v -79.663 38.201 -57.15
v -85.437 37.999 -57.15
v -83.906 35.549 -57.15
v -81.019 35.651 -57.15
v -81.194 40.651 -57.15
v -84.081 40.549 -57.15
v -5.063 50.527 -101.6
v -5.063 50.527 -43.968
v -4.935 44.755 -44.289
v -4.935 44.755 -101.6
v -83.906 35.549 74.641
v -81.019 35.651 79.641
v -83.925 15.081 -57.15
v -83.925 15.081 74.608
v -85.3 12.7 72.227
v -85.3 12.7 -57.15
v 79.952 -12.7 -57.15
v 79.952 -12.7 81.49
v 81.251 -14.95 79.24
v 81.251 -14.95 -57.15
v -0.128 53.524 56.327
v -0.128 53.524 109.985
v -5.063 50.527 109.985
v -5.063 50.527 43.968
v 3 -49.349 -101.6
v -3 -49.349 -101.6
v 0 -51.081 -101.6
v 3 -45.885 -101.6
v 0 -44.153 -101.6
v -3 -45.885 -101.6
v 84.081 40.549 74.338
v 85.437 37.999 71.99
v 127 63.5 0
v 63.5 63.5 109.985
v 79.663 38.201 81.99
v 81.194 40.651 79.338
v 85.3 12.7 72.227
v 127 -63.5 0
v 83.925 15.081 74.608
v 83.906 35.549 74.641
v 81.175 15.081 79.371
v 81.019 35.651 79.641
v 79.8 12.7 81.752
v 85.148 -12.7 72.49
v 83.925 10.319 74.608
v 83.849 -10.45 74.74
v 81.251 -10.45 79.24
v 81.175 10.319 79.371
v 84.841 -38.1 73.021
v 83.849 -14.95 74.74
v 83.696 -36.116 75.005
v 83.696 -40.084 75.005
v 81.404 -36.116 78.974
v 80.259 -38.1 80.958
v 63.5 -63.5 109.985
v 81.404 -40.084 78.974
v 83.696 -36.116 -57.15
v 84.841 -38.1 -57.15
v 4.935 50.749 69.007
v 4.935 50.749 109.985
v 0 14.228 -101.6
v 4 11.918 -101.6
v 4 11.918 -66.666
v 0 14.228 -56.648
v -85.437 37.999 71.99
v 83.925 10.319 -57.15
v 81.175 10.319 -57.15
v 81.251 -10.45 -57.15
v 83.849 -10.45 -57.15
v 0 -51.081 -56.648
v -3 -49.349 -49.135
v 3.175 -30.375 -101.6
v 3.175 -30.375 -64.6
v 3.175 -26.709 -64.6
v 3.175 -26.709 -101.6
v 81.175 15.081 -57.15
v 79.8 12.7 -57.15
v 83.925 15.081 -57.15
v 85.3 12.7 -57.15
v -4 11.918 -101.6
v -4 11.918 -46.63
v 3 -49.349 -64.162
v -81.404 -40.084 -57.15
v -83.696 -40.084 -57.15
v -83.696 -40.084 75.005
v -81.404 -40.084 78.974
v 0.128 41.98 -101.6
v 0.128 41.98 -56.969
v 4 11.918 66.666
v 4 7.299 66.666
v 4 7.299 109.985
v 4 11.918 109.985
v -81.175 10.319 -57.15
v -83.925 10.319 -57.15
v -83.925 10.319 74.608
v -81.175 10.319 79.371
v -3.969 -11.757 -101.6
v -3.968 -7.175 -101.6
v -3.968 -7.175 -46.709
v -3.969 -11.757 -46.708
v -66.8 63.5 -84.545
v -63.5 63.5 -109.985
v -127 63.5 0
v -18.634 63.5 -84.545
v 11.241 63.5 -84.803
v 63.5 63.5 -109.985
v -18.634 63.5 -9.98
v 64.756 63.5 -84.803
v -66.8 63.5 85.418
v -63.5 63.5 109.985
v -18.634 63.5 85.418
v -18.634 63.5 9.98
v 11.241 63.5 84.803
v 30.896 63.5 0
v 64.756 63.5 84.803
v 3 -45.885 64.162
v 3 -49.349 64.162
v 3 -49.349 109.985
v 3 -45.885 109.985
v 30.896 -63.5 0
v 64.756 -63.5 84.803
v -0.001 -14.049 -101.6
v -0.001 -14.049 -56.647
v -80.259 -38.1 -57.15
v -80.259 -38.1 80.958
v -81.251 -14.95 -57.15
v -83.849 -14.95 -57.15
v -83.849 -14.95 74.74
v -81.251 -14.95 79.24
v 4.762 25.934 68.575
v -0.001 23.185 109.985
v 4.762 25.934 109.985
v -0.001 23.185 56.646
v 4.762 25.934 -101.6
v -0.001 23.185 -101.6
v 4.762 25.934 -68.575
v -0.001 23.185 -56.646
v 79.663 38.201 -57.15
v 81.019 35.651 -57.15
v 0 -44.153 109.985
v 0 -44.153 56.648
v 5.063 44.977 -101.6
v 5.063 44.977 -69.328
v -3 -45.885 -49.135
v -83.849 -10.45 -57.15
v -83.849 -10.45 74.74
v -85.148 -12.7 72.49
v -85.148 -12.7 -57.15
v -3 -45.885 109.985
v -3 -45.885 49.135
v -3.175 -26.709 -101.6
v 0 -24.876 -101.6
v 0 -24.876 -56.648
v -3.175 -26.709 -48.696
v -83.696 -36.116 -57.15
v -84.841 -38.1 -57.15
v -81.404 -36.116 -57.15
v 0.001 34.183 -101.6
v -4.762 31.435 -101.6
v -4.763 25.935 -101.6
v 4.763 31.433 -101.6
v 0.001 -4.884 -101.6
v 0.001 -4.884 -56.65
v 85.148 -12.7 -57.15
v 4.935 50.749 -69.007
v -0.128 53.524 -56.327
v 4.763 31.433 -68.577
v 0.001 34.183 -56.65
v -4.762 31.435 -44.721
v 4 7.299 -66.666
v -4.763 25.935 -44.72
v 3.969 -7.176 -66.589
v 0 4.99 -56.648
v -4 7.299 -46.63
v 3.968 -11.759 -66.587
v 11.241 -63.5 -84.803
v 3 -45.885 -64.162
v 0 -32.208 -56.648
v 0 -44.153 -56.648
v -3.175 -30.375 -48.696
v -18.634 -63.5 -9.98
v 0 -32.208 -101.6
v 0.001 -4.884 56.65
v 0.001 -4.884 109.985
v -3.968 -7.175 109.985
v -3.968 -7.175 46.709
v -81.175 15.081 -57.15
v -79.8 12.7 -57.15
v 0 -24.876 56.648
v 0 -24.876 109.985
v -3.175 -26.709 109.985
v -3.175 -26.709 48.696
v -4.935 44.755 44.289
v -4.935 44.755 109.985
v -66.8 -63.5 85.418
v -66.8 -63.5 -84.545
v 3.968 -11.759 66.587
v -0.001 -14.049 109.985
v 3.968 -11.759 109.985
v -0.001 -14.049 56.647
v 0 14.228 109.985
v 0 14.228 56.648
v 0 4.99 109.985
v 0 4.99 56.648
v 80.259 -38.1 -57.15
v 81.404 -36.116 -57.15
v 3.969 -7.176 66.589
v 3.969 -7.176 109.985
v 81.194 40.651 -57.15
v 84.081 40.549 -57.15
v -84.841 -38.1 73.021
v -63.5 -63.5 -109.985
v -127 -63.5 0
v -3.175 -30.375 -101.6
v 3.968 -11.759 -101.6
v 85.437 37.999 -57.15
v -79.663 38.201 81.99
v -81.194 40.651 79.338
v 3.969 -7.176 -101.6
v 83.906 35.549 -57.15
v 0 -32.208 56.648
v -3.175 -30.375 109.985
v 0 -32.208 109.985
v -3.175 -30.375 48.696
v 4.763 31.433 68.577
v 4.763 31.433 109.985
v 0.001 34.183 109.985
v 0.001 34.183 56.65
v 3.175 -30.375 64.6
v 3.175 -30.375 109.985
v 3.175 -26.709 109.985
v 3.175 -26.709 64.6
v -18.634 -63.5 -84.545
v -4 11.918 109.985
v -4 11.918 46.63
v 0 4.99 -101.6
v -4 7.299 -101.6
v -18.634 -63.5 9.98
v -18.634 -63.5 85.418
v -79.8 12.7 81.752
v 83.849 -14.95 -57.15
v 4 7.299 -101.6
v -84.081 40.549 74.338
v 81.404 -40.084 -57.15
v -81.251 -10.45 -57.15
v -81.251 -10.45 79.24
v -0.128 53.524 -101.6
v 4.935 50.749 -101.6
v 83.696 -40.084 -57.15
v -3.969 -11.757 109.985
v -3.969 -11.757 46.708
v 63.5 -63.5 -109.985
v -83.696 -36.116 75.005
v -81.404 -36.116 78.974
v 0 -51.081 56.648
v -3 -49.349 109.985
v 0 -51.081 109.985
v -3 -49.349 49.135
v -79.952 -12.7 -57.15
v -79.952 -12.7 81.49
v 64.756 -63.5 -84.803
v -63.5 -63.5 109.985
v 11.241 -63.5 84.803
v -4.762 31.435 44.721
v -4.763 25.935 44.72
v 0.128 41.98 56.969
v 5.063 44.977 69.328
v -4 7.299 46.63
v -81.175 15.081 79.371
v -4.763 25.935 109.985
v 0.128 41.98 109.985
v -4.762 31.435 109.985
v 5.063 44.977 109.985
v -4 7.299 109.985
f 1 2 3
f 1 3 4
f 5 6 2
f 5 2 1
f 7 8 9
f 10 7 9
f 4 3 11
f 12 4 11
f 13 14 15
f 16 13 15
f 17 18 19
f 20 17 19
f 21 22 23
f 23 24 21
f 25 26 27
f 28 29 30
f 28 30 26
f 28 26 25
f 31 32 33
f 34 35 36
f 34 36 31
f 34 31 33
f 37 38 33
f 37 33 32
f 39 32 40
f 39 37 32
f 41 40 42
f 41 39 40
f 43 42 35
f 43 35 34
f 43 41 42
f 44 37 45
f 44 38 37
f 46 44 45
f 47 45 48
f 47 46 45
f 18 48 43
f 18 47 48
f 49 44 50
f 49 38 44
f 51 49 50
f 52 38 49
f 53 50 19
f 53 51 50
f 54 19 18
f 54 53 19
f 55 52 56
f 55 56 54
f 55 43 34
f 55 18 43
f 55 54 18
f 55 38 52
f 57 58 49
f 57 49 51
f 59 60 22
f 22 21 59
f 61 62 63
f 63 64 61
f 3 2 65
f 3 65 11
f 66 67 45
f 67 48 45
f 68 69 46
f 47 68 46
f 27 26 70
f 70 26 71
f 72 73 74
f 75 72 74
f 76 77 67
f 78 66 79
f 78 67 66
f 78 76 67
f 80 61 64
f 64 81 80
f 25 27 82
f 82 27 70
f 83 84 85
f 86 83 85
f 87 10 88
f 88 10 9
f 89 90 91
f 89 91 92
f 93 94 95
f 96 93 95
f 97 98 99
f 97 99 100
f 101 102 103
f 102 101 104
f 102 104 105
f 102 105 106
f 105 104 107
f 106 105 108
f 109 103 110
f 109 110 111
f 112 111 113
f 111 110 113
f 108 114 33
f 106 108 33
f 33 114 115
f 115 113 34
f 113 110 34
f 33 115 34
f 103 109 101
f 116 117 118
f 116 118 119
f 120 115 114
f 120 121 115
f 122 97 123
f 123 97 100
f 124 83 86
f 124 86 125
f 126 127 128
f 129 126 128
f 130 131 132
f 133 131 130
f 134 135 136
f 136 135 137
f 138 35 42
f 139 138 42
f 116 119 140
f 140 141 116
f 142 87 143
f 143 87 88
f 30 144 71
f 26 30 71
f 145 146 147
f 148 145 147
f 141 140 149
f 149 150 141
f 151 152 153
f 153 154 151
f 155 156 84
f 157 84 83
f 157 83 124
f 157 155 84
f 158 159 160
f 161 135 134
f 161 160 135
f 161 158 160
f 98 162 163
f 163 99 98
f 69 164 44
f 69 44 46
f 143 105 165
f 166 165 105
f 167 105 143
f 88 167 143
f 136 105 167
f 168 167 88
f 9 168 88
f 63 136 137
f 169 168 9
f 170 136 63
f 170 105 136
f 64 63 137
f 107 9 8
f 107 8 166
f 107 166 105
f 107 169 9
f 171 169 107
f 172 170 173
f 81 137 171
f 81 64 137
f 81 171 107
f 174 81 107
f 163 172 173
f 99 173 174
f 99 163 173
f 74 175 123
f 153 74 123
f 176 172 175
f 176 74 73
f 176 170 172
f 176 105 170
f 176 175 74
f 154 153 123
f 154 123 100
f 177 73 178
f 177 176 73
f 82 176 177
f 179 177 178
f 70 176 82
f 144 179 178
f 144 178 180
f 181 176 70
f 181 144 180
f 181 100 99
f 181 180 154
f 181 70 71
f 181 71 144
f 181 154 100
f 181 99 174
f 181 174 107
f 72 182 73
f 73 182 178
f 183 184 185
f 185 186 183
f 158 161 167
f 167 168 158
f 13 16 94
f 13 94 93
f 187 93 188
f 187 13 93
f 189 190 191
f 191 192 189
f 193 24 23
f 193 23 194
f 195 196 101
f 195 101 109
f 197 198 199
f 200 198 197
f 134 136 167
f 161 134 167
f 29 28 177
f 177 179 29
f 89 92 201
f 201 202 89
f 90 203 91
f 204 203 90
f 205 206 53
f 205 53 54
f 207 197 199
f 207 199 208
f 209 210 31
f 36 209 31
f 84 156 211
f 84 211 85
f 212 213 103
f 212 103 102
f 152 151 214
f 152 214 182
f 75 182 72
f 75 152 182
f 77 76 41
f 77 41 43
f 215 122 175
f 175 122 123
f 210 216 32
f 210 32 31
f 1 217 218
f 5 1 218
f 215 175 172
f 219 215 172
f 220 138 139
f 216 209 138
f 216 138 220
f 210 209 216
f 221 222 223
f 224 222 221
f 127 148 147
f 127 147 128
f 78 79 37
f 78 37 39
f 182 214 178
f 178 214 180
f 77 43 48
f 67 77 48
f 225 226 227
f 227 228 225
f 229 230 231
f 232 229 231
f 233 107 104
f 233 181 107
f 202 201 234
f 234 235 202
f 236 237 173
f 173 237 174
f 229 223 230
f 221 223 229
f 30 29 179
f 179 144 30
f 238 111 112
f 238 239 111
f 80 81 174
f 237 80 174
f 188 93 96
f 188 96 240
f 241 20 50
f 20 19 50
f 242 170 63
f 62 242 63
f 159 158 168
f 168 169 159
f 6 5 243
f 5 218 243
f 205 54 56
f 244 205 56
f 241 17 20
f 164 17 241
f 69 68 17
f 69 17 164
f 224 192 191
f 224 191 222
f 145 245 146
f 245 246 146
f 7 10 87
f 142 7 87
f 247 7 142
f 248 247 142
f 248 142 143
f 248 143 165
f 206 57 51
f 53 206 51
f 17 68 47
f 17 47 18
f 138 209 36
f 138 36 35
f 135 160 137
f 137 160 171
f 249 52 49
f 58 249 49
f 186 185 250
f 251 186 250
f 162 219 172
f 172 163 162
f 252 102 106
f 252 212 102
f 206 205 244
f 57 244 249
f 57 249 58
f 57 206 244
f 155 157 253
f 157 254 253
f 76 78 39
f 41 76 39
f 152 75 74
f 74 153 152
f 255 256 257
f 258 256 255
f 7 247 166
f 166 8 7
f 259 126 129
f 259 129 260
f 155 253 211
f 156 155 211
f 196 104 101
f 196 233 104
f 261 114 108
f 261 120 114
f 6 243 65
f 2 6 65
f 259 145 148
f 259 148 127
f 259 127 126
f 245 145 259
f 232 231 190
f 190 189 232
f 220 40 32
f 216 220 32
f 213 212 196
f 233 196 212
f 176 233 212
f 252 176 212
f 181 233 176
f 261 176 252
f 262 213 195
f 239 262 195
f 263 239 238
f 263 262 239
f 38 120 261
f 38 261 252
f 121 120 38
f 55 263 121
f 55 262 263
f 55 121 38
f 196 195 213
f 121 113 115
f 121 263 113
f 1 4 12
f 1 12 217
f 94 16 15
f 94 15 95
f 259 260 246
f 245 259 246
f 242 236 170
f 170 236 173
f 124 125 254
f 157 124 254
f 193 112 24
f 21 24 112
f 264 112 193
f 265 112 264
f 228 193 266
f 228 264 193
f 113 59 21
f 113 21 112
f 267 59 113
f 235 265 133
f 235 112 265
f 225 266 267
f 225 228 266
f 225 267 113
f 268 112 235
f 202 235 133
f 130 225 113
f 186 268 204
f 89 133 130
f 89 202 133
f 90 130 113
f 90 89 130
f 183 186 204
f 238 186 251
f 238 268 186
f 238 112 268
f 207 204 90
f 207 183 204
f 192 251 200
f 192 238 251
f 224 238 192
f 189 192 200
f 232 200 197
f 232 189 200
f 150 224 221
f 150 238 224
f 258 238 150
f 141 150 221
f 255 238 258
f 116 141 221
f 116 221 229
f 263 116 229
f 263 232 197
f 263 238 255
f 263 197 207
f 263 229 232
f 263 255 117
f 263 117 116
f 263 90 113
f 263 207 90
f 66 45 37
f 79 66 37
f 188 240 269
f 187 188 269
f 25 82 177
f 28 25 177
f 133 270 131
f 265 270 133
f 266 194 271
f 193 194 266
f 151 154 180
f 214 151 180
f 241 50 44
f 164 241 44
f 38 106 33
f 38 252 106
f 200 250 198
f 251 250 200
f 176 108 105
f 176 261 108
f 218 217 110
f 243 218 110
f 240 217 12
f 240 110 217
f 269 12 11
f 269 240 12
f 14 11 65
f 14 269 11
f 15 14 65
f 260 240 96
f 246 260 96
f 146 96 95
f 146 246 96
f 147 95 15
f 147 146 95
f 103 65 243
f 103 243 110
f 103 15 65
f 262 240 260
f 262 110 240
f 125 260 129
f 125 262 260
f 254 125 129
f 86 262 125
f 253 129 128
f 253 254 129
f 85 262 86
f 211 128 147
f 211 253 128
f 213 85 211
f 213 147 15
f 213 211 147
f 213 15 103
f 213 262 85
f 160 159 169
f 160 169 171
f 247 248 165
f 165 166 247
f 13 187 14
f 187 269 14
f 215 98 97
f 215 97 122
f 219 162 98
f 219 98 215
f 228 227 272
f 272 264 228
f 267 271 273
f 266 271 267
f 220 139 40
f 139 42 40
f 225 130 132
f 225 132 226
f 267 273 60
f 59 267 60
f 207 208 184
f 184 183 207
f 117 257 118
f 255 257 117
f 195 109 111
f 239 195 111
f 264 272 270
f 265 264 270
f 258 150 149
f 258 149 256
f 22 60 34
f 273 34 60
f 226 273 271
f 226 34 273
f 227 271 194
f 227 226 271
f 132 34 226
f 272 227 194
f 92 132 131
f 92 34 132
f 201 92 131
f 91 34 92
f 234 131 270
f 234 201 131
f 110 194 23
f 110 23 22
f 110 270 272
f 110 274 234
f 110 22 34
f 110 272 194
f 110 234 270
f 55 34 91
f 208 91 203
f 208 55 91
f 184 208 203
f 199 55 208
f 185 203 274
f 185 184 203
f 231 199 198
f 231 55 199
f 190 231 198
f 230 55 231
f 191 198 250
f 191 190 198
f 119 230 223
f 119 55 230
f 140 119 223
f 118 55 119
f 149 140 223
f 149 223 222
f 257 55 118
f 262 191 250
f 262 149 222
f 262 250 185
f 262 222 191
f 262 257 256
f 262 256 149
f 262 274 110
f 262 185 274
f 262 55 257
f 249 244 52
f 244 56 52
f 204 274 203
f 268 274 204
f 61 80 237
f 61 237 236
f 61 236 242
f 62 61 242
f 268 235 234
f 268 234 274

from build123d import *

# Parameters (mm, degrees)
F1_DEPTH = 63.5
F3_DEPTH = 57.15
F4_DEPTH = 127
F5_DEPTH = 101.6


with BuildPart() as f1:
    # F0 (on Front) → F1 (new body, symmetric)
    with BuildSketch(Plane.XZ):
        Polygon((127, 0), (63.5, 109.985226), (-63.5, 109.985226), (-127, 0), (-63.5, -109.985226), (63.5, -109.985226), align=None)
        Polygon((-66.799852, -84.545206), (-66.799852, 85.417562), (-18.633867, 85.417562), (-18.633867, 9.979562), (11.241462, 84.802525), (64.756104, 84.802525), (30.896133, 0), (64.756104, -84.802525), (11.241462, -84.802525), (-18.633867, -9.979562), (-18.633867, -84.545206), align=None, mode=Mode.SUBTRACT)
    extrude(amount=F1_DEPTH, both=True)

    # F2 (on Top) → F3 (cut)
    with BuildSketch(Plane.XY):
        Polygon((-81.175185, 15.08125), (-83.924815, 15.08125), (-85.299631, 12.7), (-83.924815, 10.31875), (-81.175185, 10.31875), (-79.800369, 12.7), align=None)
        Polygon((-81.250962, -10.45), (-83.849038, -10.45), (-85.148076, -12.7), (-83.849038, -14.95), (-81.250962, -14.95), (-79.951924, -12.7), align=None)
        Polygon((-81.404321, -36.115625), (-83.695679, -36.115625), (-84.841359, -38.1), (-83.695679, -40.084375), (-81.404321, -40.084375), (-80.258641, -38.1), align=None)
        Polygon((-85.436751, 37.998921), (-83.905839, 35.549461), (-81.019088, 35.650539), (-79.663249, 38.201079), (-81.194161, 40.650539), (-84.080912, 40.549461), align=None)
        Polygon((79.663249, 38.201079), (81.019088, 35.650539), (83.905839, 35.549461), (85.436751, 37.998921), (84.080912, 40.549461), (81.194161, 40.650539), align=None)
        Polygon((83.924815, 10.31875), (85.299631, 12.7), (83.924815, 15.08125), (81.175185, 15.08125), (79.800369, 12.7), (81.175185, 10.31875), align=None)
        Polygon((81.250962, -10.45), (79.951924, -12.7), (81.250962, -14.95), (83.849038, -14.95), (85.148076, -12.7), (83.849038, -10.45), align=None)
        Polygon((81.404321, -40.084375), (83.695679, -40.084375), (84.841359, -38.1), (83.695679, -36.115625), (81.404321, -36.115625), (80.258641, -38.1), align=None)
    extrude(amount=-F3_DEPTH, mode=Mode.SUBTRACT)

    # F2 (on Top) → F4 (cut)
    with BuildSketch(Plane.XY):
        Polygon((-85.436751, 37.998921), (-83.905839, 35.549461), (-81.019088, 35.650539), (-79.663249, 38.201079), (-81.194161, 40.650539), (-84.080912, 40.549461), align=None)
        Polygon((-81.175185, 15.08125), (-83.924815, 15.08125), (-85.299631, 12.7), (-83.924815, 10.31875), (-81.175185, 10.31875), (-79.800369, 12.7), align=None)
        Polygon((-81.250962, -10.45), (-83.849038, -10.45), (-85.148076, -12.7), (-83.849038, -14.95), (-81.250962, -14.95), (-79.951924, -12.7), align=None)
        Polygon((-81.404321, -36.115625), (-83.695679, -36.115625), (-84.841359, -38.1), (-83.695679, -40.084375), (-81.404321, -40.084375), (-80.258641, -38.1), align=None)
        Polygon((81.250962, -10.45), (79.951924, -12.7), (81.250962, -14.95), (83.849038, -14.95), (85.148076, -12.7), (83.849038, -10.45), align=None)
        Polygon((81.404321, -40.084375), (83.695679, -40.084375), (84.841359, -38.1), (83.695679, -36.115625), (81.404321, -36.115625), (80.258641, -38.1), align=None)
        Polygon((83.924815, 10.31875), (85.299631, 12.7), (83.924815, 15.08125), (81.175185, 15.08125), (79.800369, 12.7), (81.175185, 10.31875), align=None)
        Polygon((79.663249, 38.201079), (81.019088, 35.650539), (83.905839, 35.549461), (85.436751, 37.998921), (84.080912, 40.549461), (81.194161, 40.650539), align=None)
        Polygon((0.12826, 41.979922), (5.062896, 44.977038), (4.934636, 50.749116), (-0.12826, 53.524078), (-5.062896, 50.526962), (-4.934636, 44.754884), align=None)
        Polygon((-0.000787, 23.18495), (4.762107, 25.933899), (4.762893, 31.43316), (0.000787, 34.183472), (-4.762107, 31.434523), (-4.762893, 25.935262), align=None)
        Polygon((4, 7.29941), (4, 11.918212), (0, 14.227613), (-4, 11.918212), (-4, 7.29941), (0, 4.990009), align=None)
        Polygon((-0.000656, -14.049307), (3.968422, -11.758516), (3.969078, -7.175798), (0.000656, -4.883871), (-3.968422, -7.174662), (-3.969078, -11.75738), align=None)
        Polygon((3.175, -30.375076), (3.175, -26.708902), (0, -24.875815), (-3.175, -26.708902), (-3.175, -30.375076), (0, -32.208163), align=None)
        Polygon((3, -49.34944), (3, -45.885338), (0, -44.153287), (-3, -45.885338), (-3, -49.34944), (0, -51.081491), align=None)
    extrude(amount=F4_DEPTH, mode=Mode.SUBTRACT)

    # F2 (on Top) → F5 (cut)
    with BuildSketch(Plane.XY):
        Polygon((-0.000656, -14.049307), (3.968422, -11.758516), (3.969078, -7.175798), (0.000656, -4.883871), (-3.968422, -7.174662), (-3.969078, -11.75738), align=None)
        Polygon((3.175, -30.375076), (3.175, -26.708902), (0, -24.875815), (-3.175, -26.708902), (-3.175, -30.375076), (0, -32.208163), align=None)
        Polygon((4, 7.29941), (4, 11.918212), (0, 14.227613), (-4, 11.918212), (-4, 7.29941), (0, 4.990009), align=None)
        Polygon((-0.000787, 23.18495), (4.762107, 25.933899), (4.762893, 31.43316), (0.000787, 34.183472), (-4.762107, 31.434523), (-4.762893, 25.935262), align=None)
        Polygon((3, -49.34944), (3, -45.885338), (0, -44.153287), (-3, -45.885338), (-3, -49.34944), (0, -51.081491), align=None)
        Polygon((0.12826, 41.979922), (5.062896, 44.977038), (4.934636, 50.749116), (-0.12826, 53.524078), (-5.062896, 50.526962), (-4.934636, 44.754884), align=None)
    extrude(amount=-F5_DEPTH, mode=Mode.SUBTRACT)


solid = f1.part
